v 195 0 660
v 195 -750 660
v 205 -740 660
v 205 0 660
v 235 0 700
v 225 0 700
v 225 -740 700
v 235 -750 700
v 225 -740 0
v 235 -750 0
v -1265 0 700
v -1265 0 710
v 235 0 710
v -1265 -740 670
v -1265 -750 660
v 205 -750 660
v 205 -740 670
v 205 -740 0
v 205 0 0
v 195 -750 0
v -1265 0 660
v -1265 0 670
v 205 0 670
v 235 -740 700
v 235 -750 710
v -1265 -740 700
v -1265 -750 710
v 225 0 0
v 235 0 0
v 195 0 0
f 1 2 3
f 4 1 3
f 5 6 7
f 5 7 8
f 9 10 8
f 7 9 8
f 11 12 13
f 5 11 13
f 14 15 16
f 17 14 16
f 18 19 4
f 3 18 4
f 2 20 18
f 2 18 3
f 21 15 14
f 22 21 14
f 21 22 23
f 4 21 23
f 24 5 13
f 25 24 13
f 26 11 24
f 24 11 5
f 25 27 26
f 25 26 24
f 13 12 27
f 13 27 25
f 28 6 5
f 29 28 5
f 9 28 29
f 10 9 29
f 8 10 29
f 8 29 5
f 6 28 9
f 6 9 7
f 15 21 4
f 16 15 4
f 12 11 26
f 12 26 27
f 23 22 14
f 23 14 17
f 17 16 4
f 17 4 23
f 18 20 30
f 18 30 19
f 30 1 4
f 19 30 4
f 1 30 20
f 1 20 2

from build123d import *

# Parameters (mm, degrees)
F3_W      = 1500
F3_H      = 10
F7_DEPTH  = 750
F4_W      = 1470
F4_H      = 10
F8_DEPTH  = 750
F5_W      = 10
F5_H      = 700
F9_DEPTH  = 750
F6_W      = 10
F6_H      = 660
F10_DEPTH = 750
F11_SIZE  = 9.99999
F12_SIZE  = 9.99999
F13_SIZE  = 9.99999
F14_SIZE  = 9.99999


# Not quite as in the source:
# - a fillet or chamfer is up to 0.001 mm smaller than in the source, because OpenCascade refuses the exact size


with BuildPart() as f7:
    # F3 (on face) → F7 (new body)
    with BuildSketch(Plane.XZ):
        with Locations((-515, 705)):
            Rectangle(F3_W, F3_H)
    extrude(amount=F7_DEPTH)

    # F11 (size 10 in the source; OpenCascade refuses exactly that, so slightly less here)
    f11_edges = [f7.edges().sort_by_distance(p)[0] for p in [
        (-515, -750, 700),
    ]]
    chamfer(f11_edges, length=F11_SIZE)


with BuildPart() as f8:
    # F4 (on face) → F8 (new body)
    with BuildSketch(Plane.XZ):
        with Locations((-530, 665)):
            Rectangle(F4_W, F4_H)
    extrude(amount=F8_DEPTH)

    # F12 (size 10 in the source; OpenCascade refuses exactly that, so slightly less here)
    f12_edges = [f8.edges().sort_by_distance(p)[0] for p in [
        (-530, -750, 670),
    ]]
    chamfer(f12_edges, length=F12_SIZE)


with BuildPart() as f9:
    # F5 (on face) → F9 (new body)
    with BuildSketch(Plane.XZ):
        with Locations((230, 350)):
            Rectangle(F5_W, F5_H)
    extrude(amount=F9_DEPTH)

    # F14 (size 10 in the source; OpenCascade refuses exactly that, so slightly less here)
    f14_edges = [f9.edges().sort_by_distance(p)[0] for p in [
        (225, -750, 350),
    ]]
    chamfer(f14_edges, length=F14_SIZE)


with BuildPart() as f10:
    # F6 (on face) → F10 (new body)
    with BuildSketch(Plane.XZ):
        with Locations((200, 330)):
            Rectangle(F6_W, F6_H)
    extrude(amount=F10_DEPTH)

    # F13 (size 10 in the source; OpenCascade refuses exactly that, so slightly less here)
    f13_edges = [f10.edges().sort_by_distance(p)[0] for p in [
        (205, -750, 330),
    ]]
    chamfer(f13_edges, length=F13_SIZE)


solid = Compound([f7.part, f8.part, f9.part, f10.part])
